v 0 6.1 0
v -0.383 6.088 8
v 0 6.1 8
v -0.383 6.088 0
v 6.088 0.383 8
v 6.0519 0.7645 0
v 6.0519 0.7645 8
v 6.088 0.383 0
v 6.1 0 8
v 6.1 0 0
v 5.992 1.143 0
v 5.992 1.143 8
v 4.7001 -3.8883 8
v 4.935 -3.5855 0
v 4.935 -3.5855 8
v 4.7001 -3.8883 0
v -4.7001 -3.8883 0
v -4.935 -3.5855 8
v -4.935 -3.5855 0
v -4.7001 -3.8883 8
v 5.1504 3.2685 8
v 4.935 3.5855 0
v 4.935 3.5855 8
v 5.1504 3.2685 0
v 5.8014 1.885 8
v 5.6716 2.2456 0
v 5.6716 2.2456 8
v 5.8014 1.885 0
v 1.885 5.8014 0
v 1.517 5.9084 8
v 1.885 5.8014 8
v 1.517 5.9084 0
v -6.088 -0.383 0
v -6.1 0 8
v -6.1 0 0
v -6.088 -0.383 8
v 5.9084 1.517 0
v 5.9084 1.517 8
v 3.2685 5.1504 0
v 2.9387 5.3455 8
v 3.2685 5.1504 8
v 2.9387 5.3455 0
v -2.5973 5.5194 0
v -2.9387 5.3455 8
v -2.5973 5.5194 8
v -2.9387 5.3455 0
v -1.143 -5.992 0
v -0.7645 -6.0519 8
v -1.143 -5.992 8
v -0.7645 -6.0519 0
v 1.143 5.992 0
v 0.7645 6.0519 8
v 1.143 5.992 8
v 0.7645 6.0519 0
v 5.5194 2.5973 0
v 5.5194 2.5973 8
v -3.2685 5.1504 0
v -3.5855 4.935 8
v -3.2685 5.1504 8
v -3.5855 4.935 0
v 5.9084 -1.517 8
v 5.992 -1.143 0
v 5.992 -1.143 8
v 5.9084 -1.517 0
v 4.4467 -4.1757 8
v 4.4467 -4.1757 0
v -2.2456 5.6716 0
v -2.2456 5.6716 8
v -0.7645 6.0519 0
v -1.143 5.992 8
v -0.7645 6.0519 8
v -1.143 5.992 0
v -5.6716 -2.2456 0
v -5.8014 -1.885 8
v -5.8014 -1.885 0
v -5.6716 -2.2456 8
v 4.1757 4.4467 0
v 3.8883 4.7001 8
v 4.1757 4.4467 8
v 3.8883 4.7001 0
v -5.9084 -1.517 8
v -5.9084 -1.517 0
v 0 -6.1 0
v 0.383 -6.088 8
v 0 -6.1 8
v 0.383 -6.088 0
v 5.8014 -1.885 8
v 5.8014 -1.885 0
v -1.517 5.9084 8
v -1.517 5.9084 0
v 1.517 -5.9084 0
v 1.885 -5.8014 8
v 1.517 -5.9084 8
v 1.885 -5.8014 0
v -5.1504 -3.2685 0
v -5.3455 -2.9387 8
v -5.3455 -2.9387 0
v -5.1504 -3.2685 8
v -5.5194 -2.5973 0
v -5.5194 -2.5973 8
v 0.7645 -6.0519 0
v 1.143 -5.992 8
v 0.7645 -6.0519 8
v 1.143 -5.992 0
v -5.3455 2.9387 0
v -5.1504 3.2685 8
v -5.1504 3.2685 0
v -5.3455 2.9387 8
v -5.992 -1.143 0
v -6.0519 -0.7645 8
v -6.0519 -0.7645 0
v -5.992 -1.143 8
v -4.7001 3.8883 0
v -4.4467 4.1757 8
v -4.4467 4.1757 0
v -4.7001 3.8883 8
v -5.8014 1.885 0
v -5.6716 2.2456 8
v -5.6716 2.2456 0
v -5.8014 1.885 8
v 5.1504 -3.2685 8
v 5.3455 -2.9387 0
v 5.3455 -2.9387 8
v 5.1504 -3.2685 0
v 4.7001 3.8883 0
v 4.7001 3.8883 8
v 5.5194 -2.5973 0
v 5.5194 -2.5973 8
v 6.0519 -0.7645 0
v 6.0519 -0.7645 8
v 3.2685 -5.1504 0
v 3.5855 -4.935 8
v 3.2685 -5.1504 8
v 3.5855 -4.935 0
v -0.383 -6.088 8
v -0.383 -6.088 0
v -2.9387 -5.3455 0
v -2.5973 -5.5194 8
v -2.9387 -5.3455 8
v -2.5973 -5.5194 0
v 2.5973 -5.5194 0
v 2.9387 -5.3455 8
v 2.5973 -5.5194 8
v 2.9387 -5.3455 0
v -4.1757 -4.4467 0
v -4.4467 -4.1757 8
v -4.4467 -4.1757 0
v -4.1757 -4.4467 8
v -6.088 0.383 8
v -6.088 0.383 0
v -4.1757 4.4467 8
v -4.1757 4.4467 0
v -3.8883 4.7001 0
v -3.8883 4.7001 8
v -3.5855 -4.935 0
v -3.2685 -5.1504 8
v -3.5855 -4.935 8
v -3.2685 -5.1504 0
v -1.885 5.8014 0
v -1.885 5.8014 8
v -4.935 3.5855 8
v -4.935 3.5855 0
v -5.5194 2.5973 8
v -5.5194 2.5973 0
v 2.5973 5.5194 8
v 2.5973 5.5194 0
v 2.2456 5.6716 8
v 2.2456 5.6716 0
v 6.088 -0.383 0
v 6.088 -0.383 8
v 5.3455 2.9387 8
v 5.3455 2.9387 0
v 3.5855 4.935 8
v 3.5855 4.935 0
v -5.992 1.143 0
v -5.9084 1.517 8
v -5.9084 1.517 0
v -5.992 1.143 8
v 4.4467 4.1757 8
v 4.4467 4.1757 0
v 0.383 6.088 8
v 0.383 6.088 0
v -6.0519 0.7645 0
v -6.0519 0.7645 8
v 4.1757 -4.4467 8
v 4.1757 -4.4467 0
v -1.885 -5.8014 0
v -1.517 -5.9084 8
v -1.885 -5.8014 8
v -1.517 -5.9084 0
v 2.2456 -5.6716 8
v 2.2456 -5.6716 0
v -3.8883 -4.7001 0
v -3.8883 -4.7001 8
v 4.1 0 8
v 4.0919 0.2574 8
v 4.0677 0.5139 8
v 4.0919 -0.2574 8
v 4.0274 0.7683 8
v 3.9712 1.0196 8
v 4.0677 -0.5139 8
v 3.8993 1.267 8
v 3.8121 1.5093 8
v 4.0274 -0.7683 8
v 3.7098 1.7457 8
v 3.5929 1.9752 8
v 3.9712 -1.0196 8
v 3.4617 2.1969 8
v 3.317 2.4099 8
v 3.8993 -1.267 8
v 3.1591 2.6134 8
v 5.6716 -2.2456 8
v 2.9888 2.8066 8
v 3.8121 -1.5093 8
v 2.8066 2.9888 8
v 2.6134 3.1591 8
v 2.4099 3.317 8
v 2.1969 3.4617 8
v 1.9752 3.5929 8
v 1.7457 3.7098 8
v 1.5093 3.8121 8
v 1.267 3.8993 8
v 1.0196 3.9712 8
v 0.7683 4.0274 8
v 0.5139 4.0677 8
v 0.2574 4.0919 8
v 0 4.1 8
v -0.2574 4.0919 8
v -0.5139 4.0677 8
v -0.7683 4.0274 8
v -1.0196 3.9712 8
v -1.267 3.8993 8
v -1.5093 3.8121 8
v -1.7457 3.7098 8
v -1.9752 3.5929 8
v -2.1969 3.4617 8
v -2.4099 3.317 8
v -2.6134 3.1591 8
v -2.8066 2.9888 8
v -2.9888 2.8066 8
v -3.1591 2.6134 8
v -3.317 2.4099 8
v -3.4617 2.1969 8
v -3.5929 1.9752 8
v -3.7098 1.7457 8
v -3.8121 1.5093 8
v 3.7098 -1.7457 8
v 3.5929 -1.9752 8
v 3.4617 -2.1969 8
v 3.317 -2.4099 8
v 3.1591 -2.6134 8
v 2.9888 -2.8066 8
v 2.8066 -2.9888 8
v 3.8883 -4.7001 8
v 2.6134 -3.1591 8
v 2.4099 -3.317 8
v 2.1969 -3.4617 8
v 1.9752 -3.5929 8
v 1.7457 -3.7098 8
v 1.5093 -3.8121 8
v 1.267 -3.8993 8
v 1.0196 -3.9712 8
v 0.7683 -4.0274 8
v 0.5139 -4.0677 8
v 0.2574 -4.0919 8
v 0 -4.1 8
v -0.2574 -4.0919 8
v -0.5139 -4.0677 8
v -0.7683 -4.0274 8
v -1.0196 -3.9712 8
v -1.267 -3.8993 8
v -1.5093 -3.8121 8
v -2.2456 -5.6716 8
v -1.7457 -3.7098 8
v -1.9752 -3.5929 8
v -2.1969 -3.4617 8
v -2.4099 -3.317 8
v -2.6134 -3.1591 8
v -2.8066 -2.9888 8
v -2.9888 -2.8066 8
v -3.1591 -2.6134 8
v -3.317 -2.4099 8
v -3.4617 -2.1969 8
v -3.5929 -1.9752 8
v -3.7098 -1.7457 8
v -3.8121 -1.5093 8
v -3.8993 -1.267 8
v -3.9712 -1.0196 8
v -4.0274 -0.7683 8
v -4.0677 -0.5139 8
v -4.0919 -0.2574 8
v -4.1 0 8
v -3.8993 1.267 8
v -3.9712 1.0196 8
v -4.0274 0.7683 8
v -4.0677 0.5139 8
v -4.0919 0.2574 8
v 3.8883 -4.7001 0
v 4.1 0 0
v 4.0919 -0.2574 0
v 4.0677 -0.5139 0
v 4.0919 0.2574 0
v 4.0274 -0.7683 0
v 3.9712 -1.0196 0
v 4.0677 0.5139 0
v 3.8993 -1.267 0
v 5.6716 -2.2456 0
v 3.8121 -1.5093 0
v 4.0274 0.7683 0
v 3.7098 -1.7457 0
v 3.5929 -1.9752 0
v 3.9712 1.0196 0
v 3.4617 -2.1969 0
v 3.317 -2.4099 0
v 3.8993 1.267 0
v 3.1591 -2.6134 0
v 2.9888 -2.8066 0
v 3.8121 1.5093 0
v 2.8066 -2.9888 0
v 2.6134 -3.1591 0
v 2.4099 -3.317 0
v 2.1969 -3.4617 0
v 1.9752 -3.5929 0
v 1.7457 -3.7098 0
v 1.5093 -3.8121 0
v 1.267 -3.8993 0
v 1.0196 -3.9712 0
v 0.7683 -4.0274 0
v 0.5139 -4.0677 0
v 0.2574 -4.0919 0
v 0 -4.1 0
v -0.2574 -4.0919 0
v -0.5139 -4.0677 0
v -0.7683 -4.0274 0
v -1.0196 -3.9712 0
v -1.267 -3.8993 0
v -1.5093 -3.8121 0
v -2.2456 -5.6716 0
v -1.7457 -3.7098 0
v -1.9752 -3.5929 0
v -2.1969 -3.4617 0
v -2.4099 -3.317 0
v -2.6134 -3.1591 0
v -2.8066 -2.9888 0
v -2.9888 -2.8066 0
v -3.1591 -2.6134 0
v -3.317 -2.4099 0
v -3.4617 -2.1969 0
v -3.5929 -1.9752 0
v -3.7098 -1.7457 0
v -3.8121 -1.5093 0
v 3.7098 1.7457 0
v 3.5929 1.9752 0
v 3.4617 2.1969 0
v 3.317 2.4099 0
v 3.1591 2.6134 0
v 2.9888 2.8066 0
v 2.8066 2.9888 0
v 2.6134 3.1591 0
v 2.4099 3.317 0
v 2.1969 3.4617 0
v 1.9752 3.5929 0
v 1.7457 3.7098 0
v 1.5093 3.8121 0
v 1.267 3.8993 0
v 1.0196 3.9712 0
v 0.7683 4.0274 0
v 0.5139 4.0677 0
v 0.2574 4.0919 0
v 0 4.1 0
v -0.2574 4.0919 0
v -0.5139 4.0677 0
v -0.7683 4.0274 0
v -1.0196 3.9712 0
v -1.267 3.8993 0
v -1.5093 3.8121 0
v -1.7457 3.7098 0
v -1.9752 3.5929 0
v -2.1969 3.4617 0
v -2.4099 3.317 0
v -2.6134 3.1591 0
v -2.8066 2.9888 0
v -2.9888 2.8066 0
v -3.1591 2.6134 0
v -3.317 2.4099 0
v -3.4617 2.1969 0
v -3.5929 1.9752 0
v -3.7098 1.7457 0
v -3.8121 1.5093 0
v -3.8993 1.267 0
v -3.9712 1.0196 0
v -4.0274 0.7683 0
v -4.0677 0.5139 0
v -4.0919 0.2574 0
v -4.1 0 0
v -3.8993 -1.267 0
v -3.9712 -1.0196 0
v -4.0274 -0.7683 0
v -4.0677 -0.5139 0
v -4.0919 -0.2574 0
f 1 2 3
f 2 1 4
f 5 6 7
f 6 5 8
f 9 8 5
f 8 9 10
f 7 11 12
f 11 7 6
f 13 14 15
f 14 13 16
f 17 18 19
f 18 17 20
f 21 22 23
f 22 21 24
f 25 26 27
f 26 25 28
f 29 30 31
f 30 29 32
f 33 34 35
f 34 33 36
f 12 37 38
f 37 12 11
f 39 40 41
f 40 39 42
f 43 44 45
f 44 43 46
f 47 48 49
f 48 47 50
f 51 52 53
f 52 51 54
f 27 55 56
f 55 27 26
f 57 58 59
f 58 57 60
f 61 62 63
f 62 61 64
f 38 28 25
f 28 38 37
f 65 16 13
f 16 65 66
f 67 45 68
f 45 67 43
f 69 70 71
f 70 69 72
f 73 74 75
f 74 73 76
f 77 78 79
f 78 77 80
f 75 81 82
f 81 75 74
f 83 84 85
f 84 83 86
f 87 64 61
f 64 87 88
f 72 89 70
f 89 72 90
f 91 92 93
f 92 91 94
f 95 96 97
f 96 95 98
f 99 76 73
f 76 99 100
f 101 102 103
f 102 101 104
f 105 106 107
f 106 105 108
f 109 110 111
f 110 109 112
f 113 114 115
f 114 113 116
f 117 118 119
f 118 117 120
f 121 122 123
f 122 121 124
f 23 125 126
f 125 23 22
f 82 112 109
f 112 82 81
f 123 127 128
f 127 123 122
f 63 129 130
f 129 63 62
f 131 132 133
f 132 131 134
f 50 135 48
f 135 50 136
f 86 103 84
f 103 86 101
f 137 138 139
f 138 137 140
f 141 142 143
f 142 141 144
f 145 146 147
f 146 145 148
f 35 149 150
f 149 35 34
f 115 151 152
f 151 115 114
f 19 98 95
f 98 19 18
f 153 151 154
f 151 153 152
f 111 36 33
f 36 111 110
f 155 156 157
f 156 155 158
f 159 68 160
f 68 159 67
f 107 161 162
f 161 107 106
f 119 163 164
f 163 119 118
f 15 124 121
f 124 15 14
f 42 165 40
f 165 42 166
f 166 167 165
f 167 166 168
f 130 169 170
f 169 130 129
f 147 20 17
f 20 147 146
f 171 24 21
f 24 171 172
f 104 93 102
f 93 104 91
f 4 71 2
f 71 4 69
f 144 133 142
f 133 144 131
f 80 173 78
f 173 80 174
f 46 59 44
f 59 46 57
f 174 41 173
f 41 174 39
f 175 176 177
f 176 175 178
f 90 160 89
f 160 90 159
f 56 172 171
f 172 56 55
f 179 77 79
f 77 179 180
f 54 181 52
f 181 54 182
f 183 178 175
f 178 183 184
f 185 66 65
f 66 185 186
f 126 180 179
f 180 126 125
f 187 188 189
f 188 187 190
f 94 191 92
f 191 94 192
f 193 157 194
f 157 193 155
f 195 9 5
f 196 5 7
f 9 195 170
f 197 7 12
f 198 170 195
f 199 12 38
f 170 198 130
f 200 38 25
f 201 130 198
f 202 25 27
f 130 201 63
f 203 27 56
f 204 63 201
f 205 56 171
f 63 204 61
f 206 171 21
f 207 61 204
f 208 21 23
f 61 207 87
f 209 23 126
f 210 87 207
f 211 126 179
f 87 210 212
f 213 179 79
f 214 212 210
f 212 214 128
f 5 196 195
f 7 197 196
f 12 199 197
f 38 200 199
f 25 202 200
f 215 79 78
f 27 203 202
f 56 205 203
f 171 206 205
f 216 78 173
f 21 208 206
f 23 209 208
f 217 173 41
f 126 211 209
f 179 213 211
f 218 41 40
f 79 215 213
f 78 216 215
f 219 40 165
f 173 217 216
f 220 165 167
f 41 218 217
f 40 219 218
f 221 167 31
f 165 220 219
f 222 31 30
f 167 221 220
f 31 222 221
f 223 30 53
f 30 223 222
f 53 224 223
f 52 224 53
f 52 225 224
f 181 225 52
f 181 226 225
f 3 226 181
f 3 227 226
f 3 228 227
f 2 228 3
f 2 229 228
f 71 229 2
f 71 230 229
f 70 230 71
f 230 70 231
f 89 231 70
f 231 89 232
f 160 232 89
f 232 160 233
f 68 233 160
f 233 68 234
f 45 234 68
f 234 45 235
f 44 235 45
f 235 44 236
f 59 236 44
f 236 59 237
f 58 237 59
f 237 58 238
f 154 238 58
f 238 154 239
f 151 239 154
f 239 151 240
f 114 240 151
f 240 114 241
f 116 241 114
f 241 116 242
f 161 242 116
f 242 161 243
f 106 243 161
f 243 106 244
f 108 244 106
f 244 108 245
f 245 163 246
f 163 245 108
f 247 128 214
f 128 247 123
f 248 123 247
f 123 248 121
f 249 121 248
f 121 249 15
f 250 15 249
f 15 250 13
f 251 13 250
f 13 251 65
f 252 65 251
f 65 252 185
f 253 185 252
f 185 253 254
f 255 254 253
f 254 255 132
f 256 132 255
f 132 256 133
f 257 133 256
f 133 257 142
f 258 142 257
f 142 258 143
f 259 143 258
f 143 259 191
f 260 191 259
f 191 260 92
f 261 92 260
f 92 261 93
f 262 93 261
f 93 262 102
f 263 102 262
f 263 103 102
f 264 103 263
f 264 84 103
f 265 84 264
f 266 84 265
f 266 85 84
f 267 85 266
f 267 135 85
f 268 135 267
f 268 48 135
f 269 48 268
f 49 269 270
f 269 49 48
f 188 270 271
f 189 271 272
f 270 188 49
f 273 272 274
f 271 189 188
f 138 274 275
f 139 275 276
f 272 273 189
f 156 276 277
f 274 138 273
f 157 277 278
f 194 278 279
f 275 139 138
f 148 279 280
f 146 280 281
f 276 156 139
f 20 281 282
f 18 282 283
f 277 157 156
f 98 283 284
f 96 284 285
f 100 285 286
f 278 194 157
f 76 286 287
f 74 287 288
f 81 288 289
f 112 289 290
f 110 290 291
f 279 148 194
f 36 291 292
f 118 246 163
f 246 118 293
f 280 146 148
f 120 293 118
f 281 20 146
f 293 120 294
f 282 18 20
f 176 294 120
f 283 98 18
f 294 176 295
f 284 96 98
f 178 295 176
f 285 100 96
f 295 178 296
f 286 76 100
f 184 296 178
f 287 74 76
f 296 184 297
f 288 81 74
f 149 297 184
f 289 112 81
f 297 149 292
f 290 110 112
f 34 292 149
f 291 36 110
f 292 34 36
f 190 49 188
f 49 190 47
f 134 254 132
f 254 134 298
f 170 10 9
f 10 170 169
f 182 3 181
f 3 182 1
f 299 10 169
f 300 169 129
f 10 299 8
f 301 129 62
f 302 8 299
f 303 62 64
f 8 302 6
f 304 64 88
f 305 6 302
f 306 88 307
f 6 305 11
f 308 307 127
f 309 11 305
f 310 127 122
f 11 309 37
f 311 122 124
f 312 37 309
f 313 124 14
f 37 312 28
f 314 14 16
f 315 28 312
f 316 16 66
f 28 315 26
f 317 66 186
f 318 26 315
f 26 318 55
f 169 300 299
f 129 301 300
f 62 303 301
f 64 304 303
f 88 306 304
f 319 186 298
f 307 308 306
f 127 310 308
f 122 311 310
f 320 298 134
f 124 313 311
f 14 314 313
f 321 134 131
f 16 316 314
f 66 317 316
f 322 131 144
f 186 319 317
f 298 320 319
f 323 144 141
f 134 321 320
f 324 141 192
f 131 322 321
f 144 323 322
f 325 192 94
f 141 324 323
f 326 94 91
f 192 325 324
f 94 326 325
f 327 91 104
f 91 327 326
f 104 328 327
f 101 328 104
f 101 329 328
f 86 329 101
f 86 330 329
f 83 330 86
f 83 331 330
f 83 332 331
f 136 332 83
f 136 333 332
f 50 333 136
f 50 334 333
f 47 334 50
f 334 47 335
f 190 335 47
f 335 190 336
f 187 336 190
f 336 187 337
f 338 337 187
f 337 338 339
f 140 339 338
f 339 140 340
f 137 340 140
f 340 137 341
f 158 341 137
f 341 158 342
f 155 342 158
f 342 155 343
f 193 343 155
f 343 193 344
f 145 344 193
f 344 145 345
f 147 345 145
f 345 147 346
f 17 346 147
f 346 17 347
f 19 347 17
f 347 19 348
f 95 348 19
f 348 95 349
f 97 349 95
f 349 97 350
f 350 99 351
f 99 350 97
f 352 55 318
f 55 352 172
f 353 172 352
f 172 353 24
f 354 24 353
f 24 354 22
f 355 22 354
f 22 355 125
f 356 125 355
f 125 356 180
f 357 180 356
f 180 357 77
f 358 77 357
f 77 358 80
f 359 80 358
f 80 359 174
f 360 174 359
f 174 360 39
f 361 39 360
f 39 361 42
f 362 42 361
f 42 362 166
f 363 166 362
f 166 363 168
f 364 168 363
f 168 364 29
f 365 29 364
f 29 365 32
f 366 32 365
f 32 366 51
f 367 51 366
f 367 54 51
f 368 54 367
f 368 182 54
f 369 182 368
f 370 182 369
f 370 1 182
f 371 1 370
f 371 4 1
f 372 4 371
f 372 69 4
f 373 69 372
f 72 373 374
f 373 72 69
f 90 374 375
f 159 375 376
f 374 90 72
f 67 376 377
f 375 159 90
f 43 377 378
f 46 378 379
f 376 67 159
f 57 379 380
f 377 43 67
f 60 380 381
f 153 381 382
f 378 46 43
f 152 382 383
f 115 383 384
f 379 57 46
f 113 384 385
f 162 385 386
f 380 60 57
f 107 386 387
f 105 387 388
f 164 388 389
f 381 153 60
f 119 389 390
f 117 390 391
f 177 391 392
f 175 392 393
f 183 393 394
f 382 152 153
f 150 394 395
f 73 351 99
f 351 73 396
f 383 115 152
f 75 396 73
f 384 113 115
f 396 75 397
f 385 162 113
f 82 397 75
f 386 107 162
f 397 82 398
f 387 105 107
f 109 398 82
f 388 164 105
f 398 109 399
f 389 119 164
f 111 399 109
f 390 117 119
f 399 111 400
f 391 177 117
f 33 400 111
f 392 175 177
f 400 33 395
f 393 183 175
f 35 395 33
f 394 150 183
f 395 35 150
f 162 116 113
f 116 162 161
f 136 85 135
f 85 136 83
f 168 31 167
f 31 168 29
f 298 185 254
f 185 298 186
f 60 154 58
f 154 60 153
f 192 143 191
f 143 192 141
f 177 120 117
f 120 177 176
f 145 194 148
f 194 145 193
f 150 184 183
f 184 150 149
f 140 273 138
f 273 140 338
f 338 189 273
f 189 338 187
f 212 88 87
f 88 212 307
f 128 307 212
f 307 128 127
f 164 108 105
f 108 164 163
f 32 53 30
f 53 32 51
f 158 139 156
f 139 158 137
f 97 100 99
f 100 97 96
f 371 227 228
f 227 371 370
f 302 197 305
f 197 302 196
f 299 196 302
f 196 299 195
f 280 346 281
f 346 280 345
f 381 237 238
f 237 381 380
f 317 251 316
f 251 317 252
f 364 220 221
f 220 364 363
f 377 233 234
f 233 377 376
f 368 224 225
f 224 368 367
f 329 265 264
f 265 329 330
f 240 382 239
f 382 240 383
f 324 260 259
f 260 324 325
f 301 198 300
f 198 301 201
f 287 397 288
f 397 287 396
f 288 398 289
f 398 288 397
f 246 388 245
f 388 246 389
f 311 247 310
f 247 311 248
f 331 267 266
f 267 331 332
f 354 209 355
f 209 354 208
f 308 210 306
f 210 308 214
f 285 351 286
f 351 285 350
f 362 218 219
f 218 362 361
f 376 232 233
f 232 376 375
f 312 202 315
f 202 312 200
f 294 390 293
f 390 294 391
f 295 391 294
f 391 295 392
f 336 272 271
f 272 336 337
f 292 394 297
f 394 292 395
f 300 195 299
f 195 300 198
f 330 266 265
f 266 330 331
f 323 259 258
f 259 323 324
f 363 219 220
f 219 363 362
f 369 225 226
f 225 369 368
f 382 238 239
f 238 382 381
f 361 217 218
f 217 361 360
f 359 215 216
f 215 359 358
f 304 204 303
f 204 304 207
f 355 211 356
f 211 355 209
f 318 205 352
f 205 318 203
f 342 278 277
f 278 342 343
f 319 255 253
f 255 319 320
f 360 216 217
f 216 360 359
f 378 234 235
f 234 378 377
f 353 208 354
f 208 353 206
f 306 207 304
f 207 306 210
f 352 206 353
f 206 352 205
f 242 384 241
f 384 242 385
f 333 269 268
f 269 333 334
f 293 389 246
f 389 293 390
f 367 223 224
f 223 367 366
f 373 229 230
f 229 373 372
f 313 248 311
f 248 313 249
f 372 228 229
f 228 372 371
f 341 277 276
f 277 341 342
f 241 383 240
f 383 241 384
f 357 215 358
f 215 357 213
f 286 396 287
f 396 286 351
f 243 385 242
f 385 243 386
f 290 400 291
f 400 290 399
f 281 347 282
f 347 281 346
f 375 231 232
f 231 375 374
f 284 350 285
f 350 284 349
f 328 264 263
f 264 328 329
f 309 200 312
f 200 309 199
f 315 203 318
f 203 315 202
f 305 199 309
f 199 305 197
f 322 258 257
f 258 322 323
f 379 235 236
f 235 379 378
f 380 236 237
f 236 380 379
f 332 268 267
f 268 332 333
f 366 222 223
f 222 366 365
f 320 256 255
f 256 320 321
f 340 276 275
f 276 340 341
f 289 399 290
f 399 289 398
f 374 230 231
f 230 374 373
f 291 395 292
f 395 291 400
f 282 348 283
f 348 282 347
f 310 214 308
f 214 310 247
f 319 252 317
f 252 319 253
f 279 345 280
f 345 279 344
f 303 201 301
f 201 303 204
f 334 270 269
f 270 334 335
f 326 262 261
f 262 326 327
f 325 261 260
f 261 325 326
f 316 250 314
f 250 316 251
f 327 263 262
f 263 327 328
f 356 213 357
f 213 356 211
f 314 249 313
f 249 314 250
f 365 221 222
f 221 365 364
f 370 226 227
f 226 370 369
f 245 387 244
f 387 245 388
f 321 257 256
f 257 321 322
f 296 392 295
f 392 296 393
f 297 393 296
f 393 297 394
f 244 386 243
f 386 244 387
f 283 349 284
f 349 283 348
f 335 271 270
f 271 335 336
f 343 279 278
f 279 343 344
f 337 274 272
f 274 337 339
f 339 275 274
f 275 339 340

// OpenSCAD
difference() {
		cylinder(r=6.1,h = 8, $fn=100);
		cylinder(r=4.1,h = 8, $fn=100);
	}
